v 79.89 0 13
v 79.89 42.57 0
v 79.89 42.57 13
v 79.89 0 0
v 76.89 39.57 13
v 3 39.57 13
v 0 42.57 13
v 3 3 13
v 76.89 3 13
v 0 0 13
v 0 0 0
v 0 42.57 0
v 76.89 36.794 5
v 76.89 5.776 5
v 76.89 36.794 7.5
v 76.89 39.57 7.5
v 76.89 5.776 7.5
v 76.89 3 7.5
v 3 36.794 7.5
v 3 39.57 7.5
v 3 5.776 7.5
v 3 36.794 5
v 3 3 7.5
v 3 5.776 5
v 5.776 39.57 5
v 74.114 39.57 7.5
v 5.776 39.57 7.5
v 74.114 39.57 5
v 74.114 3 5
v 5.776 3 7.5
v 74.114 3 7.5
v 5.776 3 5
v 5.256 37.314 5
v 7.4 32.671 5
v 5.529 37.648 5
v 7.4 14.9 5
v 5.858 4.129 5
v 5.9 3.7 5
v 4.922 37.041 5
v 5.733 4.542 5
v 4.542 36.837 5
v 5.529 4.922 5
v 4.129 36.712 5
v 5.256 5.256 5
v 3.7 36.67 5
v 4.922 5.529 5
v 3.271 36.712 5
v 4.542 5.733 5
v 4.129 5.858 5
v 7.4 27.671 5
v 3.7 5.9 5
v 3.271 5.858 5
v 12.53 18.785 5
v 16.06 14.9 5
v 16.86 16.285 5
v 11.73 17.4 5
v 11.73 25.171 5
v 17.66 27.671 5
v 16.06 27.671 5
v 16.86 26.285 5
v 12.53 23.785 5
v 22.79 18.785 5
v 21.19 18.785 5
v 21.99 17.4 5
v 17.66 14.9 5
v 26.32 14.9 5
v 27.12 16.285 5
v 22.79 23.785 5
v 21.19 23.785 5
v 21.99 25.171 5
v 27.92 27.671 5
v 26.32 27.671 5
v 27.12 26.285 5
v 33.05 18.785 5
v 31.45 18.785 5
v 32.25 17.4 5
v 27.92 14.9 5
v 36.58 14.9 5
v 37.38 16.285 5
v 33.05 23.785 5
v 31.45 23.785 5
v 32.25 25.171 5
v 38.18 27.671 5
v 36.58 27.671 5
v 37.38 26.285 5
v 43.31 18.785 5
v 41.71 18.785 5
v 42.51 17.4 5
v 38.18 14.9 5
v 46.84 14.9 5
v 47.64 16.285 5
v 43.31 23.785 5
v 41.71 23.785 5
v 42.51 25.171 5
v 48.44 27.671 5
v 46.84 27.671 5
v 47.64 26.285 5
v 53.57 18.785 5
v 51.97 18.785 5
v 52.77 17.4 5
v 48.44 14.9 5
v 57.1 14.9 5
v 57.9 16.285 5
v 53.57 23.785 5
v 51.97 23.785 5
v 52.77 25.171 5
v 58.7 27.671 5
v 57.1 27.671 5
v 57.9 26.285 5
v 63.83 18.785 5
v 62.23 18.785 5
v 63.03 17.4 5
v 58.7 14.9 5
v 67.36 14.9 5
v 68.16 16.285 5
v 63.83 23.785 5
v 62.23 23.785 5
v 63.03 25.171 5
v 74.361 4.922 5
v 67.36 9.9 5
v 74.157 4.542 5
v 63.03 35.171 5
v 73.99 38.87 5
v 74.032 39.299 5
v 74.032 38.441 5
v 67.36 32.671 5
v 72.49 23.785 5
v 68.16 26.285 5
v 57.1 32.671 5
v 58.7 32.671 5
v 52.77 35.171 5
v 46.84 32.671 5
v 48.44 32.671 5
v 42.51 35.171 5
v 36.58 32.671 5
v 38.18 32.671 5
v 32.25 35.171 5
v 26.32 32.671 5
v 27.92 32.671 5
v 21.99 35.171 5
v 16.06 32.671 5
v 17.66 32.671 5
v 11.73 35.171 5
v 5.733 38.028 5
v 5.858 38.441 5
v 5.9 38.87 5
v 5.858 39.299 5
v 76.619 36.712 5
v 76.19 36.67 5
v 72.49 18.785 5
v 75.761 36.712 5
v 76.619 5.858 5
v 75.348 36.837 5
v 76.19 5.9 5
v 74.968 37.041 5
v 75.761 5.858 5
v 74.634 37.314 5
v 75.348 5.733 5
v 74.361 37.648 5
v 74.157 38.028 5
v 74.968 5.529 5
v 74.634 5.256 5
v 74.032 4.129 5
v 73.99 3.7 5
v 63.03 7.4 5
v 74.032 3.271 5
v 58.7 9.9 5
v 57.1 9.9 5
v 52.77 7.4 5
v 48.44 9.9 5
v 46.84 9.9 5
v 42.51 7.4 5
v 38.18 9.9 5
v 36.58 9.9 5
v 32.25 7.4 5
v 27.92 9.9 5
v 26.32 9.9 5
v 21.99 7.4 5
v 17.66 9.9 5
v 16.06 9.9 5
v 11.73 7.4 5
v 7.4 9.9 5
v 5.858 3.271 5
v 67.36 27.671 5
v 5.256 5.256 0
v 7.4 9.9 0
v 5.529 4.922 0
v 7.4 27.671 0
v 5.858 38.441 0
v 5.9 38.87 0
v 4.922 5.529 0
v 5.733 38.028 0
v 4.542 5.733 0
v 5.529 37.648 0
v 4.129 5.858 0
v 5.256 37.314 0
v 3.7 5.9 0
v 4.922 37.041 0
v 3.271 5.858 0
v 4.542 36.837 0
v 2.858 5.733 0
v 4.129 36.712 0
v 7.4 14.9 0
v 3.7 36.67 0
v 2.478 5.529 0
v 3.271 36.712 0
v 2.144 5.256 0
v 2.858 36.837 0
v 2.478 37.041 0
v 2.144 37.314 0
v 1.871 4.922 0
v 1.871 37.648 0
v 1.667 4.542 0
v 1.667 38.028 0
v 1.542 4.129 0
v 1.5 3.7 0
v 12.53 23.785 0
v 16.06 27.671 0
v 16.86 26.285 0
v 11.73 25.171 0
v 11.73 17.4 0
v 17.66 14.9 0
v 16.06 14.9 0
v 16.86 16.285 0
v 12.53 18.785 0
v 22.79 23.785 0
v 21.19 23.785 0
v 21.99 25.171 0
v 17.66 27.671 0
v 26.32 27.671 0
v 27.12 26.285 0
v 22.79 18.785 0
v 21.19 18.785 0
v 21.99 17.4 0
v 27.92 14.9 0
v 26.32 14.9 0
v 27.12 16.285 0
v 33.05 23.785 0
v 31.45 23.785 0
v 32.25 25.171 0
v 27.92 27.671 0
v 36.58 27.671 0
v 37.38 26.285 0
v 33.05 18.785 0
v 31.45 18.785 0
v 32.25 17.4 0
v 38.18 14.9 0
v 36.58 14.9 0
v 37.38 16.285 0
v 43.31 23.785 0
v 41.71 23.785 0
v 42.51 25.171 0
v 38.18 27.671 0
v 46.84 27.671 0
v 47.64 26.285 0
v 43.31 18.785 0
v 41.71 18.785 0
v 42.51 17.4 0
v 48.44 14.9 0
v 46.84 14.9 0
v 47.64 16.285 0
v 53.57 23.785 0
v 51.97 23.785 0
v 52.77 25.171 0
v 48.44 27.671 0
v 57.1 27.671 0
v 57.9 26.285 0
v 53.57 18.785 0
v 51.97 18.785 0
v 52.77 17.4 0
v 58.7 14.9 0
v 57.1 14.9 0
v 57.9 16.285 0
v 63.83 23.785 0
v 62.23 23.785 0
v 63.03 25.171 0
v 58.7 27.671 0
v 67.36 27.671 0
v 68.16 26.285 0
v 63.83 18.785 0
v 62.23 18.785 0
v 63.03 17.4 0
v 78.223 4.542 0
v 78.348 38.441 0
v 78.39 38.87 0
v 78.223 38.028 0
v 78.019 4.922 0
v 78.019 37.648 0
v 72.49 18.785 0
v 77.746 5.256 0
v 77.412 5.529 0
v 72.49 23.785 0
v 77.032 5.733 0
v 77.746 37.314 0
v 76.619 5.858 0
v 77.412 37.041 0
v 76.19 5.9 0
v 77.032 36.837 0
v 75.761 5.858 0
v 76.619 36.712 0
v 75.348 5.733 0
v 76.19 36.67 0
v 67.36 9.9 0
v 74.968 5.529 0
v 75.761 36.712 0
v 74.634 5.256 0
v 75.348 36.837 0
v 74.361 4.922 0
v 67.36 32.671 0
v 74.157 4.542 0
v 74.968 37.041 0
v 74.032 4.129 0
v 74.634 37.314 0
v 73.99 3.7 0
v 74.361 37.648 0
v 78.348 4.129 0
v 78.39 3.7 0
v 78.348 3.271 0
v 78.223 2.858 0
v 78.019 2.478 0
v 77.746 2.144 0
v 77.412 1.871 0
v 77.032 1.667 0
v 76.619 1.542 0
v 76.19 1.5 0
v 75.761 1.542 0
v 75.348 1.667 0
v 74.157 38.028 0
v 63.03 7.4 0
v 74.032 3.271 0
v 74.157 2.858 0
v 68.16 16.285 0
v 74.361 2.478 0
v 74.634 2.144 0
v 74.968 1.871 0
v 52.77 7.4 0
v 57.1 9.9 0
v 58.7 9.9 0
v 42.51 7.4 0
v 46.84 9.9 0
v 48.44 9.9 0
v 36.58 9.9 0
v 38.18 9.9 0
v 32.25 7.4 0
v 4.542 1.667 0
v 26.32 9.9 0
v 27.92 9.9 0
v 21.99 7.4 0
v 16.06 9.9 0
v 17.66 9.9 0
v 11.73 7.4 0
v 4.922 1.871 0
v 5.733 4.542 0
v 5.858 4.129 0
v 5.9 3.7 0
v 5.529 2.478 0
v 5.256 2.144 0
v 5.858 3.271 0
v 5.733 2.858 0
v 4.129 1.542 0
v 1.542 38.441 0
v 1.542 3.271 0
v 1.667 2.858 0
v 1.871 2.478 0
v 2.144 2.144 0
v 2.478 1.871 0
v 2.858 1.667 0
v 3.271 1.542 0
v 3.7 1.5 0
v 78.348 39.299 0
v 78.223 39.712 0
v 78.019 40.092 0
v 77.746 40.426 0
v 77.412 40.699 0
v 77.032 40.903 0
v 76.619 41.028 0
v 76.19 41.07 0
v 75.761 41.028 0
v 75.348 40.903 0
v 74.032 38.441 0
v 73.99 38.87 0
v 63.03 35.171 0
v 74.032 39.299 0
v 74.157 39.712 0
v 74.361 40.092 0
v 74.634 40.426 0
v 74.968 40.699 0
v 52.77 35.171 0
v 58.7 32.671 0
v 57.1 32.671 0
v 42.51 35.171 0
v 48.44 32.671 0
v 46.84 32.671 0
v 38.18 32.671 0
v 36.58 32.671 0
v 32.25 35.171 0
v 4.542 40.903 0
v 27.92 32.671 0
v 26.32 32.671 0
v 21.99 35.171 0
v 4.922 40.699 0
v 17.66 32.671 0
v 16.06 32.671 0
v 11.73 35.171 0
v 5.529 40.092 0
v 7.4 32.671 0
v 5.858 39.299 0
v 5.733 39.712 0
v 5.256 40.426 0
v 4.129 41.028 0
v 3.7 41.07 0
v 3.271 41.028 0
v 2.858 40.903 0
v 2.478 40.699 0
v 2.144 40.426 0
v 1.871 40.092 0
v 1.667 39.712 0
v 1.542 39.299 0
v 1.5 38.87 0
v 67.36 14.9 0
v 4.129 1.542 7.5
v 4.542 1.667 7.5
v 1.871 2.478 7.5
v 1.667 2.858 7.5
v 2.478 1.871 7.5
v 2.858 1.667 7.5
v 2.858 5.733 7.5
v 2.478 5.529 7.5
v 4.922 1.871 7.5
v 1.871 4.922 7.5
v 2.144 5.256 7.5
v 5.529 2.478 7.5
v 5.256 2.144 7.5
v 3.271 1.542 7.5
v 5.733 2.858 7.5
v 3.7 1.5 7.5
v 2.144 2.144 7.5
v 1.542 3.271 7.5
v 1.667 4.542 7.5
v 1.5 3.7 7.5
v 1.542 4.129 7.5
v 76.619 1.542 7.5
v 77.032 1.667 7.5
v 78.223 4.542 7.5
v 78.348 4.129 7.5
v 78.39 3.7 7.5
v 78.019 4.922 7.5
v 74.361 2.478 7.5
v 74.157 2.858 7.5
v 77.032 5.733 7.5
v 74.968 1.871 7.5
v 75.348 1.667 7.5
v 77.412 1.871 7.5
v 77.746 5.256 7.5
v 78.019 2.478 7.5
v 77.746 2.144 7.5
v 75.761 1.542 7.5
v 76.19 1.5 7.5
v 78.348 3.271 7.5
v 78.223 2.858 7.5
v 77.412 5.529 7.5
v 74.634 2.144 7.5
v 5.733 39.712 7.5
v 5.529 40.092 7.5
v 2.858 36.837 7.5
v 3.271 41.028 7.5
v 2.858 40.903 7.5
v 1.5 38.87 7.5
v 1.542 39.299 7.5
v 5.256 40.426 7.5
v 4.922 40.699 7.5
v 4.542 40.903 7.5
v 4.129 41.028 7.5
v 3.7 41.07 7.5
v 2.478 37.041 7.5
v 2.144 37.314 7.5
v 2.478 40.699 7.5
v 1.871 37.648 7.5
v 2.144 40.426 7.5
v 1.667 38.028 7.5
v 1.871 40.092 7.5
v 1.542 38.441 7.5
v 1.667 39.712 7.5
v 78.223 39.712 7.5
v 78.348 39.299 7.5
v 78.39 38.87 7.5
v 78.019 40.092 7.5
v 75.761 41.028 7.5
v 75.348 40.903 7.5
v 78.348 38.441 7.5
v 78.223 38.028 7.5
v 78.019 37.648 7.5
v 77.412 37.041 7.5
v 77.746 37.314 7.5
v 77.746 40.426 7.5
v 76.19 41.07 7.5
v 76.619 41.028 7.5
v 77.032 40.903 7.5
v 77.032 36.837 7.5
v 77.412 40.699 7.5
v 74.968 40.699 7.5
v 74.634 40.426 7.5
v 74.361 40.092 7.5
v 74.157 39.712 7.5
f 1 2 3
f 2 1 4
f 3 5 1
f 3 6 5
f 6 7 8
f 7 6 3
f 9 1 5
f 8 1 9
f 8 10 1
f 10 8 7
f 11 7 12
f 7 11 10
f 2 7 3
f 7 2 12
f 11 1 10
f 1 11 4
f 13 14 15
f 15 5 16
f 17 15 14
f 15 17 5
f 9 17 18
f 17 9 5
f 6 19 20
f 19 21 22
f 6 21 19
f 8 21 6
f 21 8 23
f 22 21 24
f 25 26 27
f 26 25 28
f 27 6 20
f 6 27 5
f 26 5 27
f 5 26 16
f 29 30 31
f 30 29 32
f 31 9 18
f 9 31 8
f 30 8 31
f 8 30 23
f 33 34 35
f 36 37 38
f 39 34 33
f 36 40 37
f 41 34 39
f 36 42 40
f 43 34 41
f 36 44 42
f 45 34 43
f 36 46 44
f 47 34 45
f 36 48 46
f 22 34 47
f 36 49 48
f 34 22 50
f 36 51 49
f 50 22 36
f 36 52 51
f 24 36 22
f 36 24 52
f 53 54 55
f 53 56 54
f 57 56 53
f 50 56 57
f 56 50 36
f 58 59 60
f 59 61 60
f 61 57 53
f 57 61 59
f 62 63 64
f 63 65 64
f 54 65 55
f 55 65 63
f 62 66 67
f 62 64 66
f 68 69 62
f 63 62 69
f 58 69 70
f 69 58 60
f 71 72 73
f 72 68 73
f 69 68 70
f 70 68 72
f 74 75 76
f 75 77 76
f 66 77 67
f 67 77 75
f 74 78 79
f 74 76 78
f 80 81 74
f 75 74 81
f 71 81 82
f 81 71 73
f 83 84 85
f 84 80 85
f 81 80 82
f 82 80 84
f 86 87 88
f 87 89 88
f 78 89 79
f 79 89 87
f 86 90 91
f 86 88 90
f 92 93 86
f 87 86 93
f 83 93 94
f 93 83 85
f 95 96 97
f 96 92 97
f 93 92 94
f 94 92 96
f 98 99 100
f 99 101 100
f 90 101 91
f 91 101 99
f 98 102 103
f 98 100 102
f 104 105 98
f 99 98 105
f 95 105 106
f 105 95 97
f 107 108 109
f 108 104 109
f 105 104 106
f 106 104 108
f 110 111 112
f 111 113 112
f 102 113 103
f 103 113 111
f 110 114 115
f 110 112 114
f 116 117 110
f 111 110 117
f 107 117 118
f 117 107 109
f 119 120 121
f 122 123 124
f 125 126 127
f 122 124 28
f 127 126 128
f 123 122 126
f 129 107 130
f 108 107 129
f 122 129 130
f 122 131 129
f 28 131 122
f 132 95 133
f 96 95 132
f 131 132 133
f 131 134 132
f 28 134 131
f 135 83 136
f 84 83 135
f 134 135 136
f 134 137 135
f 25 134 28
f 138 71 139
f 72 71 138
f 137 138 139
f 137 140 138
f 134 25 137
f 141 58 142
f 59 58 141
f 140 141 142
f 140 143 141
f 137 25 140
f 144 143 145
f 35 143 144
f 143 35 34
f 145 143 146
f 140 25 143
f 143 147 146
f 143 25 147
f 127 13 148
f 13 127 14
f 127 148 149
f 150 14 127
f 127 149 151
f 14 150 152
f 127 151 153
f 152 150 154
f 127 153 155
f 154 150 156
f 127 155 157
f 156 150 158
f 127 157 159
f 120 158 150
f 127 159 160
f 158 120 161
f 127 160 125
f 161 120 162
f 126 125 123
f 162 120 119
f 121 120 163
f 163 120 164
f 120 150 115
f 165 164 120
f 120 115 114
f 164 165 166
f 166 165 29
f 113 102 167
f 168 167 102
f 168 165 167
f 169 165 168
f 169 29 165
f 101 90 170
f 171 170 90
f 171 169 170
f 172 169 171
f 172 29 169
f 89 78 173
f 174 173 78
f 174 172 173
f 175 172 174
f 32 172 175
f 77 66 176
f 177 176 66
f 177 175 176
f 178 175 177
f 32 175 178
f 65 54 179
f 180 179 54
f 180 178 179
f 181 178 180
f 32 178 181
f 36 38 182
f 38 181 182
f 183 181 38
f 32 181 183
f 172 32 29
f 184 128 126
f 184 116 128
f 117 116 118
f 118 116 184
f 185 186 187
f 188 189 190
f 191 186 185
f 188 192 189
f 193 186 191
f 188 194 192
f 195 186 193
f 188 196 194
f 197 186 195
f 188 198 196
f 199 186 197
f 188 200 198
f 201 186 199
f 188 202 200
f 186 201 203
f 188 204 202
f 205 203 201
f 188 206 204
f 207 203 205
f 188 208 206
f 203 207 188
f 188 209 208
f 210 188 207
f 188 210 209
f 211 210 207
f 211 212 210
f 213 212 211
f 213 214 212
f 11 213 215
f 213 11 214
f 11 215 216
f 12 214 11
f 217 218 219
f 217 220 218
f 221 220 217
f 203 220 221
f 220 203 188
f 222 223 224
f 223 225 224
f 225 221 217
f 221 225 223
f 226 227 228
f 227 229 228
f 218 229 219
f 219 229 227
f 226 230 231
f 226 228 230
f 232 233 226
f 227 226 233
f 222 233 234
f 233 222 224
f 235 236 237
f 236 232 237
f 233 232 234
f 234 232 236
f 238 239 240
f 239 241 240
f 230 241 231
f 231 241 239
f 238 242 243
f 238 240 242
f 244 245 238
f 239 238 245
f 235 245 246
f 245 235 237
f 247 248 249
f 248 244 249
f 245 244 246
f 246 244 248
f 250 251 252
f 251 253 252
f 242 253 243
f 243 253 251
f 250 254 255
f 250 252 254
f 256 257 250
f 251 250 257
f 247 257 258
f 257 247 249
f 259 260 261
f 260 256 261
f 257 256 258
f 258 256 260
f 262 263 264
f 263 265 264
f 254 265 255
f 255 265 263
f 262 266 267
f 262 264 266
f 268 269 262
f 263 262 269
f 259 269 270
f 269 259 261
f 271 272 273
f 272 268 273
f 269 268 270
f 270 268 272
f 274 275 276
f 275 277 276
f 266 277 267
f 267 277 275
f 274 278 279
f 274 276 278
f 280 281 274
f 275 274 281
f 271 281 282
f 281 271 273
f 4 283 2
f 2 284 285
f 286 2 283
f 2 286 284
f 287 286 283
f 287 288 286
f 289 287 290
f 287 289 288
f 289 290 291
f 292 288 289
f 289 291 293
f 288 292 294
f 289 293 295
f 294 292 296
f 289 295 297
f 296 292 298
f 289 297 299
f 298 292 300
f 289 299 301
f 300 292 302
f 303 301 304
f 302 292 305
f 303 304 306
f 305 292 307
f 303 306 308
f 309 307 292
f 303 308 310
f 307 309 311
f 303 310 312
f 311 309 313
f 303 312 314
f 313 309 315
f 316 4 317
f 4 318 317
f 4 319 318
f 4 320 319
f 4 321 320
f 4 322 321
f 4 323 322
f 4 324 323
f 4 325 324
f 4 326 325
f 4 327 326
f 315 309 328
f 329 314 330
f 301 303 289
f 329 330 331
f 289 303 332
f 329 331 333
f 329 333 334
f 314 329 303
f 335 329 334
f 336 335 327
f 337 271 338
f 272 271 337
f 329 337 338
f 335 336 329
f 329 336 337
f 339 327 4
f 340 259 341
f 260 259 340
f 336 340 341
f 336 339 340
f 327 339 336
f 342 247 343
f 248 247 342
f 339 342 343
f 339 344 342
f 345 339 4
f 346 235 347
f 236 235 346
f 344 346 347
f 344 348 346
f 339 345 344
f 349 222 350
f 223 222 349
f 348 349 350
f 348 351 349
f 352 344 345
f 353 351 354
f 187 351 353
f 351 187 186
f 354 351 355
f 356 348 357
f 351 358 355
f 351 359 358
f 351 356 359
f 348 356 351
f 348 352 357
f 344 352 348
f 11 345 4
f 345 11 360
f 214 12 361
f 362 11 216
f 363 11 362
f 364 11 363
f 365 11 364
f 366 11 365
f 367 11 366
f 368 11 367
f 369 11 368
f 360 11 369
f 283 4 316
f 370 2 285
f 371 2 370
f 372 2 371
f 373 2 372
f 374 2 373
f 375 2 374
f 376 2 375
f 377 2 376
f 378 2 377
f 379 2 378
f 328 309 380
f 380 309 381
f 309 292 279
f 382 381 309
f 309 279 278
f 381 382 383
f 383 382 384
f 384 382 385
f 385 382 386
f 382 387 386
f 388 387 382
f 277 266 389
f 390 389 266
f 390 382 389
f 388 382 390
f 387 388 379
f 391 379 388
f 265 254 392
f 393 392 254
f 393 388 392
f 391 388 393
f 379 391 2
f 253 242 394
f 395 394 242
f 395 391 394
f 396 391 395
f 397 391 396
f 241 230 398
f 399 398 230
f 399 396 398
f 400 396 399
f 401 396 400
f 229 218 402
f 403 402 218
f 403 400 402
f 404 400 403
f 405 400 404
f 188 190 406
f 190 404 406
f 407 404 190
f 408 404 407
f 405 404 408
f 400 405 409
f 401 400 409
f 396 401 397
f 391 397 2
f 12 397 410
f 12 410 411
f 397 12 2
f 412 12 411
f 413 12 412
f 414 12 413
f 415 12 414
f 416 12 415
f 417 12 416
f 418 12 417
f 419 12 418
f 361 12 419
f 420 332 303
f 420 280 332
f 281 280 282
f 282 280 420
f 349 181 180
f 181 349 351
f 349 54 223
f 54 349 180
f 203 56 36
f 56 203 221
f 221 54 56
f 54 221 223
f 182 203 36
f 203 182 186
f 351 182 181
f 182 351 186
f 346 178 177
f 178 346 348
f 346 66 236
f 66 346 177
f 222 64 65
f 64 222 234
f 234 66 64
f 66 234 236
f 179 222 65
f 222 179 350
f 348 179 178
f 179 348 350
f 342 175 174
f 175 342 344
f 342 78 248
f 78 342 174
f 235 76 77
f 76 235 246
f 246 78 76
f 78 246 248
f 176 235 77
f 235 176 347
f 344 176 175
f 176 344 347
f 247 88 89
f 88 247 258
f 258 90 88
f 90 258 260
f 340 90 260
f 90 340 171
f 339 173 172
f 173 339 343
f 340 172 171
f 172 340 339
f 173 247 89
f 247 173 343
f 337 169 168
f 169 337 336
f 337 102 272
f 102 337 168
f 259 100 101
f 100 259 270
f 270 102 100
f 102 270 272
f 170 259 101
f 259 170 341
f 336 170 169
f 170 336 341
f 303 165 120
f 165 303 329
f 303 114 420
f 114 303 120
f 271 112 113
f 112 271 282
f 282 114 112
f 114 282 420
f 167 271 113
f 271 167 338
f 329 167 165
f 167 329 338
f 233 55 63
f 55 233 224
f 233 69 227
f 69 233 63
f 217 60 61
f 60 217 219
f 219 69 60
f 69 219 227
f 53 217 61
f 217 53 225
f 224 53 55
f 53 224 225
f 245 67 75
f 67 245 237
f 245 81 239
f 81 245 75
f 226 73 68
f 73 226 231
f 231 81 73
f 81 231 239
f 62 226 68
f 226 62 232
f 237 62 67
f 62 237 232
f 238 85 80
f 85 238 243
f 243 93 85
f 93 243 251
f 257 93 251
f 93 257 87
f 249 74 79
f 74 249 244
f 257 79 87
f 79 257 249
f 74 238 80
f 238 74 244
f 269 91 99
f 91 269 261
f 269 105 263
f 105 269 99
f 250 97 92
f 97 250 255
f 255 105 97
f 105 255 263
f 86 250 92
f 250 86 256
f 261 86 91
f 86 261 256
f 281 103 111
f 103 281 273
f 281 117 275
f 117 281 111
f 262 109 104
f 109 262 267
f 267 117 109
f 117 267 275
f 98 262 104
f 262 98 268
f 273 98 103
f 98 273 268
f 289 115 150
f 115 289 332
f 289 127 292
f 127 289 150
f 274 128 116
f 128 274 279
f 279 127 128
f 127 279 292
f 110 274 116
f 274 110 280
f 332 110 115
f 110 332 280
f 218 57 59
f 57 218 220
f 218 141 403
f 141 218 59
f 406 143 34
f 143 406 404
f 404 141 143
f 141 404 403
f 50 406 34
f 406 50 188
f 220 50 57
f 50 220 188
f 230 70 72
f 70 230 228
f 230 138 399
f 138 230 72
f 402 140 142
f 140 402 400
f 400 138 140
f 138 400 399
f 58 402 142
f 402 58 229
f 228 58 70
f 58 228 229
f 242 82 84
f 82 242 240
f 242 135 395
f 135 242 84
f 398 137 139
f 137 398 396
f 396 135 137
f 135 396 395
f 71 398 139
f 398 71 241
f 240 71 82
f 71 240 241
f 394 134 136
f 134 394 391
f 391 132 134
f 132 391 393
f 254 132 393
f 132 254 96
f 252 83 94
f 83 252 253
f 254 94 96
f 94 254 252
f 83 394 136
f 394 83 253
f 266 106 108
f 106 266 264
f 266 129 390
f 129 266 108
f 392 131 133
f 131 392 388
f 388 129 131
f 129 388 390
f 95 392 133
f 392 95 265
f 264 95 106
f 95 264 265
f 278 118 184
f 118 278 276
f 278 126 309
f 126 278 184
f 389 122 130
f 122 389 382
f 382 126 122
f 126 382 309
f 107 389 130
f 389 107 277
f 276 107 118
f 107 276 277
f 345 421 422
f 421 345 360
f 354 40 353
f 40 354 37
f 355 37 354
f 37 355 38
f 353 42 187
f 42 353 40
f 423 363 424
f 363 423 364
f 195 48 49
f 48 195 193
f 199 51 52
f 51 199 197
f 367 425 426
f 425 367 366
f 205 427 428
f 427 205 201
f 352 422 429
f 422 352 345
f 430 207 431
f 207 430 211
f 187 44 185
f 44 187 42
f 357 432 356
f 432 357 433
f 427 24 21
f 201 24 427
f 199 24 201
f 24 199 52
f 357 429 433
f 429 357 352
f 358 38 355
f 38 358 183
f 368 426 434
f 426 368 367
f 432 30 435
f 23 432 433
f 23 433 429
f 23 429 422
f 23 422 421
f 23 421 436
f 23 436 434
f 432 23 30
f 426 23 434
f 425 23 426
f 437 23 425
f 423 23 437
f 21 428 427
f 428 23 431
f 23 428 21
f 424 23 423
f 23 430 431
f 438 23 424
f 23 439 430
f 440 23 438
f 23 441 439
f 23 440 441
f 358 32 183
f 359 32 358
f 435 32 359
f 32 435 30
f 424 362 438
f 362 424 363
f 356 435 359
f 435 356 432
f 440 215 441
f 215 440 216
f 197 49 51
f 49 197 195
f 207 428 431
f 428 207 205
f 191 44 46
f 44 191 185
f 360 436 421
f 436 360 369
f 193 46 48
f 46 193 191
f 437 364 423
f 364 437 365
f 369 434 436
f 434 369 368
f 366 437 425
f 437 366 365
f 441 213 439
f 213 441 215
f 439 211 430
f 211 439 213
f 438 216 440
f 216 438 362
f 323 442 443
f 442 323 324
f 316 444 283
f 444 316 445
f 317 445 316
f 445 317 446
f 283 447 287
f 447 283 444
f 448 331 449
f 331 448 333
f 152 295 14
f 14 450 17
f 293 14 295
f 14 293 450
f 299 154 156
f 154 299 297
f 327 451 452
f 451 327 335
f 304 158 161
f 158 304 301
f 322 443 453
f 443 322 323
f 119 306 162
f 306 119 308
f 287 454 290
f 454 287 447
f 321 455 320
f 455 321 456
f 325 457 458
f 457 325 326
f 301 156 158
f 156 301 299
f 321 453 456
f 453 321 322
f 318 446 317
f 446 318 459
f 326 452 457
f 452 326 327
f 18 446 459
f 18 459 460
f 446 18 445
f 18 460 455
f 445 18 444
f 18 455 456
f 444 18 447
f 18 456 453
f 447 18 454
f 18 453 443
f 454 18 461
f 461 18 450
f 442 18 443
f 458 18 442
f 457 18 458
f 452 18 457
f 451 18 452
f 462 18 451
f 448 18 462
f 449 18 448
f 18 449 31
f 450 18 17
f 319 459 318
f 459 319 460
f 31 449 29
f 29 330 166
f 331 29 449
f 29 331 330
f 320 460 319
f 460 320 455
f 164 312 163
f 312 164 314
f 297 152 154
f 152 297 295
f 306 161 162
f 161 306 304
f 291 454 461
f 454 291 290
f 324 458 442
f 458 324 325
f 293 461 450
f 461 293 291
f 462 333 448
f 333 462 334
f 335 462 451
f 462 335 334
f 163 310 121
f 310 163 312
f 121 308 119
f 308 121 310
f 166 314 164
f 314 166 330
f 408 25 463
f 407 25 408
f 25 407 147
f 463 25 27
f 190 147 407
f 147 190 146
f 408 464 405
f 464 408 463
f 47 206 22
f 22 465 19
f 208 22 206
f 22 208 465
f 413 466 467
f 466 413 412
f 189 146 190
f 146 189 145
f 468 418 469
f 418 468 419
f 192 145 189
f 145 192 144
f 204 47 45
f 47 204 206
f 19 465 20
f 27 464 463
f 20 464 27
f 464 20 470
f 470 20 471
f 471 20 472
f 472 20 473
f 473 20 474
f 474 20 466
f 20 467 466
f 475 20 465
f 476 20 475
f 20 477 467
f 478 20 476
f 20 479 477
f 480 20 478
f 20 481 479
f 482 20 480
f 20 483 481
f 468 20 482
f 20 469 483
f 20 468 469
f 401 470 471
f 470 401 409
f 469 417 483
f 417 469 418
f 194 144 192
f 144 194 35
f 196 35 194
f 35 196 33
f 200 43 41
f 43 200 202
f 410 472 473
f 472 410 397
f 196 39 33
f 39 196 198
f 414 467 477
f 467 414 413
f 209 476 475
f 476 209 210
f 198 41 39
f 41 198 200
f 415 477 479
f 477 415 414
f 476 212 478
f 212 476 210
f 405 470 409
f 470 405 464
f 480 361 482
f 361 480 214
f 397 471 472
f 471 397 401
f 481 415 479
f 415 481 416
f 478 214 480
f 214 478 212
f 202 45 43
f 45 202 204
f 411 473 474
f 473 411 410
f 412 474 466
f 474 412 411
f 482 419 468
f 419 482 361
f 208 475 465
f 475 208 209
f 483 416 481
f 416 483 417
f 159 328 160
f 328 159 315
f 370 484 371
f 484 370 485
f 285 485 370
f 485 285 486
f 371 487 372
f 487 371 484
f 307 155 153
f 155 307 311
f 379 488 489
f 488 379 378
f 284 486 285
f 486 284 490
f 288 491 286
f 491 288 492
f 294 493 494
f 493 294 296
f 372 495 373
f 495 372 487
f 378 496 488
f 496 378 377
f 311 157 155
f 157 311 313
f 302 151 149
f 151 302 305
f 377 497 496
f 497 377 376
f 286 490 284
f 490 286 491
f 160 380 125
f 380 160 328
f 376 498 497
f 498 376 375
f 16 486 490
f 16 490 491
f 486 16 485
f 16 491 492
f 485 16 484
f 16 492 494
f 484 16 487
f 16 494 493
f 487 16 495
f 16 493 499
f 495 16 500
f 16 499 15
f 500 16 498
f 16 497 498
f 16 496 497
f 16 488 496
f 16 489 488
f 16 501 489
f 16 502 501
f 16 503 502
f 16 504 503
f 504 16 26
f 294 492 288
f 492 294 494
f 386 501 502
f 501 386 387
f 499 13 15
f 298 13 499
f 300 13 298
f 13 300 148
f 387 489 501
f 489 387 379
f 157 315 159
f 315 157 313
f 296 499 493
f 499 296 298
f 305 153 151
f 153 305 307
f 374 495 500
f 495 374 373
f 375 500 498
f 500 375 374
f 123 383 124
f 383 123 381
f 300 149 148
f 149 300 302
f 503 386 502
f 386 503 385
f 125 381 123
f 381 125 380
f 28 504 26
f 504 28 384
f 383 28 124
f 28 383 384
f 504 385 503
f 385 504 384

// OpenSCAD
$fn = 32;

// ----------------------------------------------------------------------
// Honeycomb panel: 79.89 x 42.57 mm, 18 cells of 10 mm
// ----------------------------------------------------------------------

// --- parameters (mm) ---
panel_w = 79.89;          // panel width
panel_d = 42.57;          // panel depth
thick = 5;                // panel thickness
cell_r = 5;               // hex cell circumradius
pitch = 10.26;            // hex cell pitch (centre to centre)
web = 1.6;                // web between the cells
columns = 6;              // columns of cells
rows = 3;                 // rows of cells
cell_count = 18;          // total cells
shift_x = 11.73;          // first cell offset in x
shift_y = 12.4;           // first cell offset in y
mount_d = 4.4;            // corner mounting holes
hole_off = 3.7;           // mounting hole offset from the corners
rim_h = 13;               // rim height
rim_t = 3;                // rim wall thickness

difference() {
  union() {
    cube([panel_w, panel_d, thick]);
    /* rim around the panel, sunk 1 mm into the plate */
    translate([0, 0, thick - 1]) difference() {
      cube([panel_w, panel_d, rim_h - thick + 1]);
      translate([rim_t, rim_t, -2.5]) cube([panel_w - 2 * rim_t, panel_d - 2 * rim_t, rim_h - thick + 6]);
    }
  }
  /* hexagonal cells, point-up, cut right through the plate */
  for (row = [0 : rows - 1]) {
    for (col = [0 : columns - 1]) {
      translate([shift_x + col * pitch + (row % 2) * pitch / 2, shift_y + row * pitch * 0.866025, -2.5]) rotate([0, 0, 30]) cylinder(h = thick + 5, d = 2 * cell_r, $fn = 6);
    }
  }
  /* corner mounting holes, clear of the outer cell web */
  translate([3.7, 3.7, -2.5]) cylinder(h = thick + 5, d = mount_d);
  translate([76.19, 3.7, -2.5]) cylinder(h = thick + 5, d = mount_d);
  translate([3.7, 38.87, -2.5]) cylinder(h = thick + 5, d = mount_d);
  translate([76.19, 38.87, -2.5]) cylinder(h = thick + 5, d = mount_d);
}
